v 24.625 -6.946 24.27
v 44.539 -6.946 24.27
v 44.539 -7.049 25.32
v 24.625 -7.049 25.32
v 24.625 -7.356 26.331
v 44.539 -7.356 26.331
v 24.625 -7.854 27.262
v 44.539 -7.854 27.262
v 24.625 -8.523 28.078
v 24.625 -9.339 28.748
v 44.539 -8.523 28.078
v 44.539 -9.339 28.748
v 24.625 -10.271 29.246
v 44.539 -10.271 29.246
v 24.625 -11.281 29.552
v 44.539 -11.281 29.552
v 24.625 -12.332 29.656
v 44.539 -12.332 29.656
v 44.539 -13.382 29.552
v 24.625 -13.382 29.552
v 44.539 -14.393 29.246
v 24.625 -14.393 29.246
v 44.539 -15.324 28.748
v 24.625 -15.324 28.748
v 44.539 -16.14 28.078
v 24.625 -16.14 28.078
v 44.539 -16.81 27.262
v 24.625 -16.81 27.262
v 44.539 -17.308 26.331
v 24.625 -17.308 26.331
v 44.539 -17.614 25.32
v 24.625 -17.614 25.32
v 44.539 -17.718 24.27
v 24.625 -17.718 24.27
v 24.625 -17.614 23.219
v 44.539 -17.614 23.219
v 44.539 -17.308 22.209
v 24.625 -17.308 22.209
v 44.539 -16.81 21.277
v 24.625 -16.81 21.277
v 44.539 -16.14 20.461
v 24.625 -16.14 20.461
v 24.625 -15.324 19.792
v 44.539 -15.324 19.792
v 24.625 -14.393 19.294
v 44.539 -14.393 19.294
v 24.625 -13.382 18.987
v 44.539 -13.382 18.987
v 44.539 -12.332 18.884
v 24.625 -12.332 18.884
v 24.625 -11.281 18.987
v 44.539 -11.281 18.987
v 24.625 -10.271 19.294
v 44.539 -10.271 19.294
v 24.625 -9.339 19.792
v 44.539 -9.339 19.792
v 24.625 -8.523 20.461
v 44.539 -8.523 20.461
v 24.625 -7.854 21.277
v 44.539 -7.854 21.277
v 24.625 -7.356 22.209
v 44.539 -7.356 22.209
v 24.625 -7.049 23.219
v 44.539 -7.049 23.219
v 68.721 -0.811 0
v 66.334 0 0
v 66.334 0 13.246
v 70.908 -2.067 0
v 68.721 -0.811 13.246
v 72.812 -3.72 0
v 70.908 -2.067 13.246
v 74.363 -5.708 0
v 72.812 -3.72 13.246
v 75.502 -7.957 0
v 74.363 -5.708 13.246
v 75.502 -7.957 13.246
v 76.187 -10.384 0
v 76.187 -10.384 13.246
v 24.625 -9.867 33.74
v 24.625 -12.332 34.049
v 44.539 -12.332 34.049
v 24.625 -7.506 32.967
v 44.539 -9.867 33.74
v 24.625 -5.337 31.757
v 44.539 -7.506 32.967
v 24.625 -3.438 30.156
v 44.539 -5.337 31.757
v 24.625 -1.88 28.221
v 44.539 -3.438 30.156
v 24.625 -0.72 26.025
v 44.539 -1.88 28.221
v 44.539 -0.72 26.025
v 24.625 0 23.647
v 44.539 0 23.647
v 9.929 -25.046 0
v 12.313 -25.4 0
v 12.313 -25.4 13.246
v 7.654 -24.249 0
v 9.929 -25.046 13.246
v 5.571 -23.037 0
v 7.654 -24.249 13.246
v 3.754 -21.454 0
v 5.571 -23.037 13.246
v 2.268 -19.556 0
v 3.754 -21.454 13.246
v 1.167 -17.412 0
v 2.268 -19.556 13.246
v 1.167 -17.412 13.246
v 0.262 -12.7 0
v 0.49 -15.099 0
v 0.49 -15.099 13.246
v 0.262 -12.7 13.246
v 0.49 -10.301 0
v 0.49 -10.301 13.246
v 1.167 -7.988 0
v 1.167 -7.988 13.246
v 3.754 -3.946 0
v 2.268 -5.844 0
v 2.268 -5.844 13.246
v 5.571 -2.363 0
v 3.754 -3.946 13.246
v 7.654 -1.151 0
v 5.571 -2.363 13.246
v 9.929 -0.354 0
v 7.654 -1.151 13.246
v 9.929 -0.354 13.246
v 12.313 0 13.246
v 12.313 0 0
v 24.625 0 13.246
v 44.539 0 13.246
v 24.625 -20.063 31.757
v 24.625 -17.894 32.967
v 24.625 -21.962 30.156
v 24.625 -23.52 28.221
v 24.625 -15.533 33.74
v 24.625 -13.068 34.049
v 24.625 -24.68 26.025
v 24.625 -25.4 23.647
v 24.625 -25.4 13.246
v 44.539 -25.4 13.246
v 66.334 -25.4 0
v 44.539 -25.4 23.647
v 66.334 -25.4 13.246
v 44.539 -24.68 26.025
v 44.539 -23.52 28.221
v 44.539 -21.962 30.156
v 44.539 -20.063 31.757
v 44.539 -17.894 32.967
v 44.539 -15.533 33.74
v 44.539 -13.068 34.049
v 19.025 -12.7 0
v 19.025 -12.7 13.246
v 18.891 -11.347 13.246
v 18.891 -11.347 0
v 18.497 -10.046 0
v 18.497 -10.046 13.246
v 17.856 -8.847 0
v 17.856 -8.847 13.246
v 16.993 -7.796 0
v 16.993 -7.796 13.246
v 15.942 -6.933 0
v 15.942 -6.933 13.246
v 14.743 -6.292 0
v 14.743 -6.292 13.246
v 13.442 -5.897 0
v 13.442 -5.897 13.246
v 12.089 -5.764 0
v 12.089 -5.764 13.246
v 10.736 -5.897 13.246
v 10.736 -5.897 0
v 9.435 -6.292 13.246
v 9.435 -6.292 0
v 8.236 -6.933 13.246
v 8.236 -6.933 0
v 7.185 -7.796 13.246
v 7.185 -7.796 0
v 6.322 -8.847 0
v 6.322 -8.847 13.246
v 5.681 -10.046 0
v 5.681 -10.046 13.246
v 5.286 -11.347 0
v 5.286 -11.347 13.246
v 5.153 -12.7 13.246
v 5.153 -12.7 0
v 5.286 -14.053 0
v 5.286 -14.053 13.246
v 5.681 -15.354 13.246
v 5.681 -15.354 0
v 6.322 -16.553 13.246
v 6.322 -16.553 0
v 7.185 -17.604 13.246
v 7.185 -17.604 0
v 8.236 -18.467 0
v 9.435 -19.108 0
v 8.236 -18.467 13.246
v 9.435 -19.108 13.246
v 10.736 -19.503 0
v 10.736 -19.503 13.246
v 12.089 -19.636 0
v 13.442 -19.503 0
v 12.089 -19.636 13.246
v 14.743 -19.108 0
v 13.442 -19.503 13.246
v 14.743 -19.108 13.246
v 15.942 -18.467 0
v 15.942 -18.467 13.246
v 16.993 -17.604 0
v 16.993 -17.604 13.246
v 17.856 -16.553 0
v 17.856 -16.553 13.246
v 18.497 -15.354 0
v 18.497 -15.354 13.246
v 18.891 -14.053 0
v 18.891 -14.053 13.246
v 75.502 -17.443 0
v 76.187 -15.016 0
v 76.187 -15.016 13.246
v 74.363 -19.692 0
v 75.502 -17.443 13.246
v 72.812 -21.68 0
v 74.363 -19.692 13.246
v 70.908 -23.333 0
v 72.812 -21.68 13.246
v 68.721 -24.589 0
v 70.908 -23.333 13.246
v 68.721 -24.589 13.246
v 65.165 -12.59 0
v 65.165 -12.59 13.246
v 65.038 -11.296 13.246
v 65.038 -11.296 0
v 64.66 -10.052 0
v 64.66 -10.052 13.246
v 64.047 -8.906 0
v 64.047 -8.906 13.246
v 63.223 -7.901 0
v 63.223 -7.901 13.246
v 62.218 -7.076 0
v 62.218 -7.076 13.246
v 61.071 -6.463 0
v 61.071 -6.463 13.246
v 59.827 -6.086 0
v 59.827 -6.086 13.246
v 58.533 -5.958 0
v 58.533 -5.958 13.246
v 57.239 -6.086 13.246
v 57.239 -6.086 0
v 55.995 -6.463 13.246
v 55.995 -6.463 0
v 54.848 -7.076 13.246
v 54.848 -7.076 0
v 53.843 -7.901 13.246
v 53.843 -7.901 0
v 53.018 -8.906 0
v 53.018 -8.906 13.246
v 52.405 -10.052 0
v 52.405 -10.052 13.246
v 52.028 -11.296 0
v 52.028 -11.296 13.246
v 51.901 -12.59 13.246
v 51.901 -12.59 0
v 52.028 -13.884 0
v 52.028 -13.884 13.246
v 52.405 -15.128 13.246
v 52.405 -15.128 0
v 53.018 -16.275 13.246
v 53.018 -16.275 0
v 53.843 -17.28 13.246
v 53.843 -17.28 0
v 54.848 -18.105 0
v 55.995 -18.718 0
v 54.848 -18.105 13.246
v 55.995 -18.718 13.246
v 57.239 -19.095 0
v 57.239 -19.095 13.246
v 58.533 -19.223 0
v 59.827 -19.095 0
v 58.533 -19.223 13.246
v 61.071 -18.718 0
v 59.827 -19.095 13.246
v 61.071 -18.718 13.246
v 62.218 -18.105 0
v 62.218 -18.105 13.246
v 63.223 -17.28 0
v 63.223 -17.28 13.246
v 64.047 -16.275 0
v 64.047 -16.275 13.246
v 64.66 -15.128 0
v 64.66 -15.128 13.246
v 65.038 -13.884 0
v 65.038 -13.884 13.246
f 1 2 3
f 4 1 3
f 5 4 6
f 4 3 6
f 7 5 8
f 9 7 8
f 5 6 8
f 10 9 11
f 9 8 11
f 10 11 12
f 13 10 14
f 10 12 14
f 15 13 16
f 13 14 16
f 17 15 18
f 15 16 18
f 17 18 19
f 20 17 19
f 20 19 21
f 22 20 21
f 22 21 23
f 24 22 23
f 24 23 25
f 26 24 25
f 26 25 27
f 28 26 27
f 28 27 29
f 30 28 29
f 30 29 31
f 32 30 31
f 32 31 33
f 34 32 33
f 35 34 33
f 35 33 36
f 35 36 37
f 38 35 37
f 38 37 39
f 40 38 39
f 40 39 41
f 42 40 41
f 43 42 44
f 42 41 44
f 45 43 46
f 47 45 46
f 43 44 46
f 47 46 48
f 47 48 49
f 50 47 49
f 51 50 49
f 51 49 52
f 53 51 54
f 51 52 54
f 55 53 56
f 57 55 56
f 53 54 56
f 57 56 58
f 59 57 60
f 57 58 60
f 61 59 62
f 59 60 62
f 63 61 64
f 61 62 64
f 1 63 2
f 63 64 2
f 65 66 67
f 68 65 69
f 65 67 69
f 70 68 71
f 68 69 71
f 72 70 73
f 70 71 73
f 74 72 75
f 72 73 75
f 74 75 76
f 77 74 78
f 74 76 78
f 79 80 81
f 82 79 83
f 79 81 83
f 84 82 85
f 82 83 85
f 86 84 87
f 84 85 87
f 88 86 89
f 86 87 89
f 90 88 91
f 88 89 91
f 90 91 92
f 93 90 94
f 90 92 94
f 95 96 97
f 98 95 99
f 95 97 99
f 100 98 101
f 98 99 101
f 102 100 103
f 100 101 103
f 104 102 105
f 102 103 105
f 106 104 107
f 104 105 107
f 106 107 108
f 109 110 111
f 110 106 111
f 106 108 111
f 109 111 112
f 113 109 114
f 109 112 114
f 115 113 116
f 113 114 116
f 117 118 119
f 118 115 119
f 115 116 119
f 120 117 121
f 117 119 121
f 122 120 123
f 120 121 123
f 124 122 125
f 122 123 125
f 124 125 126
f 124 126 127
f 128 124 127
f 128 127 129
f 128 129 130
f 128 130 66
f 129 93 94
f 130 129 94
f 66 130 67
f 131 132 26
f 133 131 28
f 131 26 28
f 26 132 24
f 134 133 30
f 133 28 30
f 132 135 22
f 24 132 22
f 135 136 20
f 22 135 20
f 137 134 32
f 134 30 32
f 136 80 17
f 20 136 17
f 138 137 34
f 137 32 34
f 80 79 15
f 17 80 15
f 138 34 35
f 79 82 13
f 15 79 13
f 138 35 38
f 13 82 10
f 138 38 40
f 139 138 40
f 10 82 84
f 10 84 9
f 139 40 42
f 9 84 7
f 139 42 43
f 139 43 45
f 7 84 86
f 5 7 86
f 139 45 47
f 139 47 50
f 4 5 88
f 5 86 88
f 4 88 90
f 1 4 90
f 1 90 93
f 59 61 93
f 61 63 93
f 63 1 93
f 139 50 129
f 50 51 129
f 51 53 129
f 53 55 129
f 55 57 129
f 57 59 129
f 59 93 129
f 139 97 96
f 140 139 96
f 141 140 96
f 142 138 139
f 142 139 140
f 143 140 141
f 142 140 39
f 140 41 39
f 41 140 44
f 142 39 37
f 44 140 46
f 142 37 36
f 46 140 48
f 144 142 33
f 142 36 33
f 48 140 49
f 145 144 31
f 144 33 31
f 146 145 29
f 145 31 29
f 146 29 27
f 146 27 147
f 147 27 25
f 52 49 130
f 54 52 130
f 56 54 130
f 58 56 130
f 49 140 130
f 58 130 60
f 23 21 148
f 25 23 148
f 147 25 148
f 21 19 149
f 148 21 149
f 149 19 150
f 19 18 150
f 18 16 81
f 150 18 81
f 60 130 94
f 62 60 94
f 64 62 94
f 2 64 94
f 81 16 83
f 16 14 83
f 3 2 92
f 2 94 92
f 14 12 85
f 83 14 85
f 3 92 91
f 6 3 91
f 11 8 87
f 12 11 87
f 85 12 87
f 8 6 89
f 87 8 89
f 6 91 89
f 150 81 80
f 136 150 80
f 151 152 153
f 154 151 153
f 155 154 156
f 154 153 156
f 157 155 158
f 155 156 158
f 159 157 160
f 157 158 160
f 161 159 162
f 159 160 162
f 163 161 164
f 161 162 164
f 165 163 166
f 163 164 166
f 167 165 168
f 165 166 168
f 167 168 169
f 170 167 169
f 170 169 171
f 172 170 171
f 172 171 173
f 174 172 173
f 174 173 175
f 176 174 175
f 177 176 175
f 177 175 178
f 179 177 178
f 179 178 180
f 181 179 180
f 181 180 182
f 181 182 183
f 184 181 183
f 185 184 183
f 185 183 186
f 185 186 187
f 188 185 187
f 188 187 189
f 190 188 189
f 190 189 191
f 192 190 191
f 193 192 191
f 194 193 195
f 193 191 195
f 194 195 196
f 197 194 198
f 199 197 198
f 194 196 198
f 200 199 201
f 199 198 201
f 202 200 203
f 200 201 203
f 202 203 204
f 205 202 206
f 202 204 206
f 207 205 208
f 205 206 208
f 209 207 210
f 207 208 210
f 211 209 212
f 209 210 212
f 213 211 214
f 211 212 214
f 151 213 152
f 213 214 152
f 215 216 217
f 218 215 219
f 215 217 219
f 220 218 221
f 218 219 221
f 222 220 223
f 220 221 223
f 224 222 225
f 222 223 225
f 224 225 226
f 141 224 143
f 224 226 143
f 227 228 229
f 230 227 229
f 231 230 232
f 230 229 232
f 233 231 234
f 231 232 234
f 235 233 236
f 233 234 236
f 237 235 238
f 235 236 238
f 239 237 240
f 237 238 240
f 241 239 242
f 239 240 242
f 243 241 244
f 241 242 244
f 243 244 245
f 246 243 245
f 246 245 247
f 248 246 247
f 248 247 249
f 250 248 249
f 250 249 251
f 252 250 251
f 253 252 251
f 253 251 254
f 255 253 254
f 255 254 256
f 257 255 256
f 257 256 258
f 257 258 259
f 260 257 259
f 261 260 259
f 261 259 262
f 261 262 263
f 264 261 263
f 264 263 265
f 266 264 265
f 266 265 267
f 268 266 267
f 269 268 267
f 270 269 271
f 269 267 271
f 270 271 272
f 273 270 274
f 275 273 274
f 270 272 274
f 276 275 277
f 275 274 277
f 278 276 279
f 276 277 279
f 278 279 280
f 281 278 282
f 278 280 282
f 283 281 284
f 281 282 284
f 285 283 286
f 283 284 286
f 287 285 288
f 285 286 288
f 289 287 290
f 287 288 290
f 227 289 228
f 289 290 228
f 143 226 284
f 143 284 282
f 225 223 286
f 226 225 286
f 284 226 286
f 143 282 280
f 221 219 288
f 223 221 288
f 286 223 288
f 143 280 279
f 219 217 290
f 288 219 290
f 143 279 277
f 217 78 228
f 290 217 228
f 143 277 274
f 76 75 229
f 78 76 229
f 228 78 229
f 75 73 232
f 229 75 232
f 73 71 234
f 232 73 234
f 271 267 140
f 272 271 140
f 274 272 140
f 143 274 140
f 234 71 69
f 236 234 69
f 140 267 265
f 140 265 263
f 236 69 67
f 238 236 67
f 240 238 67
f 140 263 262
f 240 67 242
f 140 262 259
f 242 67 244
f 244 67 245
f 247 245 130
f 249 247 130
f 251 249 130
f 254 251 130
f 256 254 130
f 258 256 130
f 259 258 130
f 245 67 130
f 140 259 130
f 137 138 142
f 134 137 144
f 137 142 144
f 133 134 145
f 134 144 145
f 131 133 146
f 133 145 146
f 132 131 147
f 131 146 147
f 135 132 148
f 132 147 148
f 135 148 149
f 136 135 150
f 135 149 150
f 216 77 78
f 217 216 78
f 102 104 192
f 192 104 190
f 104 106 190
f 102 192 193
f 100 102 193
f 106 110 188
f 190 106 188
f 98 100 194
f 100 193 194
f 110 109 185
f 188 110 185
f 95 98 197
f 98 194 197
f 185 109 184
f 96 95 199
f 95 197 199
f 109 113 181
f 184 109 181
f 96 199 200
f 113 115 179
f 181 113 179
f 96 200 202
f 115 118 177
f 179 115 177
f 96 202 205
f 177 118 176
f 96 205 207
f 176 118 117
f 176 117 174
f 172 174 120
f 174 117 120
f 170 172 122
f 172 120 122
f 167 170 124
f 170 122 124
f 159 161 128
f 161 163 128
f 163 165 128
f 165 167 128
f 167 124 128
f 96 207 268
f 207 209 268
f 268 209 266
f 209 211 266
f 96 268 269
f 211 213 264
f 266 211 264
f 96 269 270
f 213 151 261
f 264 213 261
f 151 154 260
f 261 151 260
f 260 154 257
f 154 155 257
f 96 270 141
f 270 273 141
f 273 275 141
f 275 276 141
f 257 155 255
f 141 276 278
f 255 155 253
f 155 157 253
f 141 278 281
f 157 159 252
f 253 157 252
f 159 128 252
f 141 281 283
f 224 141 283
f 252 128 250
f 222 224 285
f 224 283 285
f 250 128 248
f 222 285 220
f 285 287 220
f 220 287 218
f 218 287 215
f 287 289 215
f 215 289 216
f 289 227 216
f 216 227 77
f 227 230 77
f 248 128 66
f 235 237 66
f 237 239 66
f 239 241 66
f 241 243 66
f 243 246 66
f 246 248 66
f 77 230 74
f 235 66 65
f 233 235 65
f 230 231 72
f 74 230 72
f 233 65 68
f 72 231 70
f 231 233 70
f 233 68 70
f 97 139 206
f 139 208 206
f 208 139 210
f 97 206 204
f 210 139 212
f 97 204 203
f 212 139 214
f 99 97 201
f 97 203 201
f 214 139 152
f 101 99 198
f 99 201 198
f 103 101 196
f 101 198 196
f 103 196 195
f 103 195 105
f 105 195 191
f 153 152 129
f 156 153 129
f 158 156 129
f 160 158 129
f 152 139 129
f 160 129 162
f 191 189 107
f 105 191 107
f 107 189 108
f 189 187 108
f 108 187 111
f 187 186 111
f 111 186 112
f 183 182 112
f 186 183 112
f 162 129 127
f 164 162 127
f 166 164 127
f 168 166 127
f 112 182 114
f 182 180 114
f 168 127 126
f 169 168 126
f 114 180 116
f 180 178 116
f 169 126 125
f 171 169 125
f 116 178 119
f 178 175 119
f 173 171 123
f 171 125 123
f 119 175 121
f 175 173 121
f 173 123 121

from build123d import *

# Parameters (mm, degrees)
F1_DEPTH  = 25.4
F2_R      = 6.9358016154
F2_R_2    = 6.6322643692
F3_DEPTH  = 13.2470994646
F5_DEPTH  = 44.5399002562
F6_R      = 5.3858777777
F7_DEPTH  = 44.5399002562
F9_DEPTH  = 13.2470994646
F11_DEPTH = 13.2470994646


with BuildPart() as f1:
    # F0 (on Front) → F1 (new body)
    with BuildSketch(Plane.XZ):
        Polygon((0, 13.2460994646), (0, 0), (76.1873051524, 0), (76.1873051524, 13.2460994646), (44.5389002562, 13.2460994646), (44.5389002562, 34.0486988425), (24.6252994984, 34.0486988425), (24.6252994984, 13.2460994646), align=None)
    extrude(amount=F1_DEPTH)

    # F2 (on face) → F3 (cut, through all)
    with BuildSketch(Plane.XY.offset(13.2460994646)):
        with Locations((12.0889488608, -12.7)):
            Circle(F2_R)
        with Locations((58.5328303277, -12.590335682)):
            Circle(F2_R_2)
    extrude(amount=-F3_DEPTH, mode=Mode.SUBTRACT)

    # F4 (on face) → F5 (cut, through all)
    with BuildSketch(Plane.YZ.offset(44.5389002562)):
        with BuildLine():
            ThreePointArc((-25.4, 23.6473991536), (-21.0511599992, 31.0022821178), (-13.0682997406, 34.0486988425))
            Line((-13.0682997406, 34.0486988425), (-25.4, 34.0486988425))
            Line((-25.4, 34.0486988425), (-25.4, 23.6473991536))
        make_face()
        with BuildLine():
            ThreePointArc((-12.3317002594, 34.0486988425), (-4.3488400008, 31.0022821178), (0, 23.6473991536))
            Line((0, 23.6473991536), (0, 34.0486988425))
            Line((0, 34.0486988425), (-12.3317002594, 34.0486988425))
        make_face()
    extrude(amount=-F5_DEPTH, mode=Mode.SUBTRACT)

    # F6 (on face) → F7 (cut, through all)
    with BuildSketch(Plane.YZ.offset(44.5389002562)):
        with Locations((-12.3317002594, 24.269701913)):
            Circle(F6_R)
    extrude(amount=-F7_DEPTH, mode=Mode.SUBTRACT)

    # F8 (on face) → F9 (cut, through all)
    with BuildSketch(Plane.XY.offset(13.2460994646)):
        with BuildLine():
            ThreePointArc((12.3126497492, -25.4), (0.2620769816, -12.7), (12.3126497492, 0))
            Line((12.3126497492, 0), (0, 0))
            Line((0, 0), (0, -25.4))
            Line((0, -25.4), (12.3126497492, -25.4))
        make_face()
    extrude(amount=-F9_DEPTH, mode=Mode.SUBTRACT)

    # F10 (on face) → F11 (cut, through all)
    with BuildSketch(Plane.XY.offset(13.2460994646)):
        with BuildLine():
            ThreePointArc((66.3337183287, 0), (72.8118717617, -3.7197458837), (76.1873051524, -10.383786007))
            Line((76.1873051524, -10.383786007), (76.1873051524, 0))
            Line((76.1873051524, 0), (66.3337183287, 0))
        make_face()
        with BuildLine():
            ThreePointArc((76.1873051524, -15.016213993), (72.8118717617, -21.6802541163), (66.3337183287, -25.4))
            Line((66.3337183287, -25.4), (76.1873051524, -25.4))
            Line((76.1873051524, -25.4), (76.1873051524, -15.016213993))
        make_face()
    extrude(amount=-F11_DEPTH, mode=Mode.SUBTRACT)


solid = f1.part
